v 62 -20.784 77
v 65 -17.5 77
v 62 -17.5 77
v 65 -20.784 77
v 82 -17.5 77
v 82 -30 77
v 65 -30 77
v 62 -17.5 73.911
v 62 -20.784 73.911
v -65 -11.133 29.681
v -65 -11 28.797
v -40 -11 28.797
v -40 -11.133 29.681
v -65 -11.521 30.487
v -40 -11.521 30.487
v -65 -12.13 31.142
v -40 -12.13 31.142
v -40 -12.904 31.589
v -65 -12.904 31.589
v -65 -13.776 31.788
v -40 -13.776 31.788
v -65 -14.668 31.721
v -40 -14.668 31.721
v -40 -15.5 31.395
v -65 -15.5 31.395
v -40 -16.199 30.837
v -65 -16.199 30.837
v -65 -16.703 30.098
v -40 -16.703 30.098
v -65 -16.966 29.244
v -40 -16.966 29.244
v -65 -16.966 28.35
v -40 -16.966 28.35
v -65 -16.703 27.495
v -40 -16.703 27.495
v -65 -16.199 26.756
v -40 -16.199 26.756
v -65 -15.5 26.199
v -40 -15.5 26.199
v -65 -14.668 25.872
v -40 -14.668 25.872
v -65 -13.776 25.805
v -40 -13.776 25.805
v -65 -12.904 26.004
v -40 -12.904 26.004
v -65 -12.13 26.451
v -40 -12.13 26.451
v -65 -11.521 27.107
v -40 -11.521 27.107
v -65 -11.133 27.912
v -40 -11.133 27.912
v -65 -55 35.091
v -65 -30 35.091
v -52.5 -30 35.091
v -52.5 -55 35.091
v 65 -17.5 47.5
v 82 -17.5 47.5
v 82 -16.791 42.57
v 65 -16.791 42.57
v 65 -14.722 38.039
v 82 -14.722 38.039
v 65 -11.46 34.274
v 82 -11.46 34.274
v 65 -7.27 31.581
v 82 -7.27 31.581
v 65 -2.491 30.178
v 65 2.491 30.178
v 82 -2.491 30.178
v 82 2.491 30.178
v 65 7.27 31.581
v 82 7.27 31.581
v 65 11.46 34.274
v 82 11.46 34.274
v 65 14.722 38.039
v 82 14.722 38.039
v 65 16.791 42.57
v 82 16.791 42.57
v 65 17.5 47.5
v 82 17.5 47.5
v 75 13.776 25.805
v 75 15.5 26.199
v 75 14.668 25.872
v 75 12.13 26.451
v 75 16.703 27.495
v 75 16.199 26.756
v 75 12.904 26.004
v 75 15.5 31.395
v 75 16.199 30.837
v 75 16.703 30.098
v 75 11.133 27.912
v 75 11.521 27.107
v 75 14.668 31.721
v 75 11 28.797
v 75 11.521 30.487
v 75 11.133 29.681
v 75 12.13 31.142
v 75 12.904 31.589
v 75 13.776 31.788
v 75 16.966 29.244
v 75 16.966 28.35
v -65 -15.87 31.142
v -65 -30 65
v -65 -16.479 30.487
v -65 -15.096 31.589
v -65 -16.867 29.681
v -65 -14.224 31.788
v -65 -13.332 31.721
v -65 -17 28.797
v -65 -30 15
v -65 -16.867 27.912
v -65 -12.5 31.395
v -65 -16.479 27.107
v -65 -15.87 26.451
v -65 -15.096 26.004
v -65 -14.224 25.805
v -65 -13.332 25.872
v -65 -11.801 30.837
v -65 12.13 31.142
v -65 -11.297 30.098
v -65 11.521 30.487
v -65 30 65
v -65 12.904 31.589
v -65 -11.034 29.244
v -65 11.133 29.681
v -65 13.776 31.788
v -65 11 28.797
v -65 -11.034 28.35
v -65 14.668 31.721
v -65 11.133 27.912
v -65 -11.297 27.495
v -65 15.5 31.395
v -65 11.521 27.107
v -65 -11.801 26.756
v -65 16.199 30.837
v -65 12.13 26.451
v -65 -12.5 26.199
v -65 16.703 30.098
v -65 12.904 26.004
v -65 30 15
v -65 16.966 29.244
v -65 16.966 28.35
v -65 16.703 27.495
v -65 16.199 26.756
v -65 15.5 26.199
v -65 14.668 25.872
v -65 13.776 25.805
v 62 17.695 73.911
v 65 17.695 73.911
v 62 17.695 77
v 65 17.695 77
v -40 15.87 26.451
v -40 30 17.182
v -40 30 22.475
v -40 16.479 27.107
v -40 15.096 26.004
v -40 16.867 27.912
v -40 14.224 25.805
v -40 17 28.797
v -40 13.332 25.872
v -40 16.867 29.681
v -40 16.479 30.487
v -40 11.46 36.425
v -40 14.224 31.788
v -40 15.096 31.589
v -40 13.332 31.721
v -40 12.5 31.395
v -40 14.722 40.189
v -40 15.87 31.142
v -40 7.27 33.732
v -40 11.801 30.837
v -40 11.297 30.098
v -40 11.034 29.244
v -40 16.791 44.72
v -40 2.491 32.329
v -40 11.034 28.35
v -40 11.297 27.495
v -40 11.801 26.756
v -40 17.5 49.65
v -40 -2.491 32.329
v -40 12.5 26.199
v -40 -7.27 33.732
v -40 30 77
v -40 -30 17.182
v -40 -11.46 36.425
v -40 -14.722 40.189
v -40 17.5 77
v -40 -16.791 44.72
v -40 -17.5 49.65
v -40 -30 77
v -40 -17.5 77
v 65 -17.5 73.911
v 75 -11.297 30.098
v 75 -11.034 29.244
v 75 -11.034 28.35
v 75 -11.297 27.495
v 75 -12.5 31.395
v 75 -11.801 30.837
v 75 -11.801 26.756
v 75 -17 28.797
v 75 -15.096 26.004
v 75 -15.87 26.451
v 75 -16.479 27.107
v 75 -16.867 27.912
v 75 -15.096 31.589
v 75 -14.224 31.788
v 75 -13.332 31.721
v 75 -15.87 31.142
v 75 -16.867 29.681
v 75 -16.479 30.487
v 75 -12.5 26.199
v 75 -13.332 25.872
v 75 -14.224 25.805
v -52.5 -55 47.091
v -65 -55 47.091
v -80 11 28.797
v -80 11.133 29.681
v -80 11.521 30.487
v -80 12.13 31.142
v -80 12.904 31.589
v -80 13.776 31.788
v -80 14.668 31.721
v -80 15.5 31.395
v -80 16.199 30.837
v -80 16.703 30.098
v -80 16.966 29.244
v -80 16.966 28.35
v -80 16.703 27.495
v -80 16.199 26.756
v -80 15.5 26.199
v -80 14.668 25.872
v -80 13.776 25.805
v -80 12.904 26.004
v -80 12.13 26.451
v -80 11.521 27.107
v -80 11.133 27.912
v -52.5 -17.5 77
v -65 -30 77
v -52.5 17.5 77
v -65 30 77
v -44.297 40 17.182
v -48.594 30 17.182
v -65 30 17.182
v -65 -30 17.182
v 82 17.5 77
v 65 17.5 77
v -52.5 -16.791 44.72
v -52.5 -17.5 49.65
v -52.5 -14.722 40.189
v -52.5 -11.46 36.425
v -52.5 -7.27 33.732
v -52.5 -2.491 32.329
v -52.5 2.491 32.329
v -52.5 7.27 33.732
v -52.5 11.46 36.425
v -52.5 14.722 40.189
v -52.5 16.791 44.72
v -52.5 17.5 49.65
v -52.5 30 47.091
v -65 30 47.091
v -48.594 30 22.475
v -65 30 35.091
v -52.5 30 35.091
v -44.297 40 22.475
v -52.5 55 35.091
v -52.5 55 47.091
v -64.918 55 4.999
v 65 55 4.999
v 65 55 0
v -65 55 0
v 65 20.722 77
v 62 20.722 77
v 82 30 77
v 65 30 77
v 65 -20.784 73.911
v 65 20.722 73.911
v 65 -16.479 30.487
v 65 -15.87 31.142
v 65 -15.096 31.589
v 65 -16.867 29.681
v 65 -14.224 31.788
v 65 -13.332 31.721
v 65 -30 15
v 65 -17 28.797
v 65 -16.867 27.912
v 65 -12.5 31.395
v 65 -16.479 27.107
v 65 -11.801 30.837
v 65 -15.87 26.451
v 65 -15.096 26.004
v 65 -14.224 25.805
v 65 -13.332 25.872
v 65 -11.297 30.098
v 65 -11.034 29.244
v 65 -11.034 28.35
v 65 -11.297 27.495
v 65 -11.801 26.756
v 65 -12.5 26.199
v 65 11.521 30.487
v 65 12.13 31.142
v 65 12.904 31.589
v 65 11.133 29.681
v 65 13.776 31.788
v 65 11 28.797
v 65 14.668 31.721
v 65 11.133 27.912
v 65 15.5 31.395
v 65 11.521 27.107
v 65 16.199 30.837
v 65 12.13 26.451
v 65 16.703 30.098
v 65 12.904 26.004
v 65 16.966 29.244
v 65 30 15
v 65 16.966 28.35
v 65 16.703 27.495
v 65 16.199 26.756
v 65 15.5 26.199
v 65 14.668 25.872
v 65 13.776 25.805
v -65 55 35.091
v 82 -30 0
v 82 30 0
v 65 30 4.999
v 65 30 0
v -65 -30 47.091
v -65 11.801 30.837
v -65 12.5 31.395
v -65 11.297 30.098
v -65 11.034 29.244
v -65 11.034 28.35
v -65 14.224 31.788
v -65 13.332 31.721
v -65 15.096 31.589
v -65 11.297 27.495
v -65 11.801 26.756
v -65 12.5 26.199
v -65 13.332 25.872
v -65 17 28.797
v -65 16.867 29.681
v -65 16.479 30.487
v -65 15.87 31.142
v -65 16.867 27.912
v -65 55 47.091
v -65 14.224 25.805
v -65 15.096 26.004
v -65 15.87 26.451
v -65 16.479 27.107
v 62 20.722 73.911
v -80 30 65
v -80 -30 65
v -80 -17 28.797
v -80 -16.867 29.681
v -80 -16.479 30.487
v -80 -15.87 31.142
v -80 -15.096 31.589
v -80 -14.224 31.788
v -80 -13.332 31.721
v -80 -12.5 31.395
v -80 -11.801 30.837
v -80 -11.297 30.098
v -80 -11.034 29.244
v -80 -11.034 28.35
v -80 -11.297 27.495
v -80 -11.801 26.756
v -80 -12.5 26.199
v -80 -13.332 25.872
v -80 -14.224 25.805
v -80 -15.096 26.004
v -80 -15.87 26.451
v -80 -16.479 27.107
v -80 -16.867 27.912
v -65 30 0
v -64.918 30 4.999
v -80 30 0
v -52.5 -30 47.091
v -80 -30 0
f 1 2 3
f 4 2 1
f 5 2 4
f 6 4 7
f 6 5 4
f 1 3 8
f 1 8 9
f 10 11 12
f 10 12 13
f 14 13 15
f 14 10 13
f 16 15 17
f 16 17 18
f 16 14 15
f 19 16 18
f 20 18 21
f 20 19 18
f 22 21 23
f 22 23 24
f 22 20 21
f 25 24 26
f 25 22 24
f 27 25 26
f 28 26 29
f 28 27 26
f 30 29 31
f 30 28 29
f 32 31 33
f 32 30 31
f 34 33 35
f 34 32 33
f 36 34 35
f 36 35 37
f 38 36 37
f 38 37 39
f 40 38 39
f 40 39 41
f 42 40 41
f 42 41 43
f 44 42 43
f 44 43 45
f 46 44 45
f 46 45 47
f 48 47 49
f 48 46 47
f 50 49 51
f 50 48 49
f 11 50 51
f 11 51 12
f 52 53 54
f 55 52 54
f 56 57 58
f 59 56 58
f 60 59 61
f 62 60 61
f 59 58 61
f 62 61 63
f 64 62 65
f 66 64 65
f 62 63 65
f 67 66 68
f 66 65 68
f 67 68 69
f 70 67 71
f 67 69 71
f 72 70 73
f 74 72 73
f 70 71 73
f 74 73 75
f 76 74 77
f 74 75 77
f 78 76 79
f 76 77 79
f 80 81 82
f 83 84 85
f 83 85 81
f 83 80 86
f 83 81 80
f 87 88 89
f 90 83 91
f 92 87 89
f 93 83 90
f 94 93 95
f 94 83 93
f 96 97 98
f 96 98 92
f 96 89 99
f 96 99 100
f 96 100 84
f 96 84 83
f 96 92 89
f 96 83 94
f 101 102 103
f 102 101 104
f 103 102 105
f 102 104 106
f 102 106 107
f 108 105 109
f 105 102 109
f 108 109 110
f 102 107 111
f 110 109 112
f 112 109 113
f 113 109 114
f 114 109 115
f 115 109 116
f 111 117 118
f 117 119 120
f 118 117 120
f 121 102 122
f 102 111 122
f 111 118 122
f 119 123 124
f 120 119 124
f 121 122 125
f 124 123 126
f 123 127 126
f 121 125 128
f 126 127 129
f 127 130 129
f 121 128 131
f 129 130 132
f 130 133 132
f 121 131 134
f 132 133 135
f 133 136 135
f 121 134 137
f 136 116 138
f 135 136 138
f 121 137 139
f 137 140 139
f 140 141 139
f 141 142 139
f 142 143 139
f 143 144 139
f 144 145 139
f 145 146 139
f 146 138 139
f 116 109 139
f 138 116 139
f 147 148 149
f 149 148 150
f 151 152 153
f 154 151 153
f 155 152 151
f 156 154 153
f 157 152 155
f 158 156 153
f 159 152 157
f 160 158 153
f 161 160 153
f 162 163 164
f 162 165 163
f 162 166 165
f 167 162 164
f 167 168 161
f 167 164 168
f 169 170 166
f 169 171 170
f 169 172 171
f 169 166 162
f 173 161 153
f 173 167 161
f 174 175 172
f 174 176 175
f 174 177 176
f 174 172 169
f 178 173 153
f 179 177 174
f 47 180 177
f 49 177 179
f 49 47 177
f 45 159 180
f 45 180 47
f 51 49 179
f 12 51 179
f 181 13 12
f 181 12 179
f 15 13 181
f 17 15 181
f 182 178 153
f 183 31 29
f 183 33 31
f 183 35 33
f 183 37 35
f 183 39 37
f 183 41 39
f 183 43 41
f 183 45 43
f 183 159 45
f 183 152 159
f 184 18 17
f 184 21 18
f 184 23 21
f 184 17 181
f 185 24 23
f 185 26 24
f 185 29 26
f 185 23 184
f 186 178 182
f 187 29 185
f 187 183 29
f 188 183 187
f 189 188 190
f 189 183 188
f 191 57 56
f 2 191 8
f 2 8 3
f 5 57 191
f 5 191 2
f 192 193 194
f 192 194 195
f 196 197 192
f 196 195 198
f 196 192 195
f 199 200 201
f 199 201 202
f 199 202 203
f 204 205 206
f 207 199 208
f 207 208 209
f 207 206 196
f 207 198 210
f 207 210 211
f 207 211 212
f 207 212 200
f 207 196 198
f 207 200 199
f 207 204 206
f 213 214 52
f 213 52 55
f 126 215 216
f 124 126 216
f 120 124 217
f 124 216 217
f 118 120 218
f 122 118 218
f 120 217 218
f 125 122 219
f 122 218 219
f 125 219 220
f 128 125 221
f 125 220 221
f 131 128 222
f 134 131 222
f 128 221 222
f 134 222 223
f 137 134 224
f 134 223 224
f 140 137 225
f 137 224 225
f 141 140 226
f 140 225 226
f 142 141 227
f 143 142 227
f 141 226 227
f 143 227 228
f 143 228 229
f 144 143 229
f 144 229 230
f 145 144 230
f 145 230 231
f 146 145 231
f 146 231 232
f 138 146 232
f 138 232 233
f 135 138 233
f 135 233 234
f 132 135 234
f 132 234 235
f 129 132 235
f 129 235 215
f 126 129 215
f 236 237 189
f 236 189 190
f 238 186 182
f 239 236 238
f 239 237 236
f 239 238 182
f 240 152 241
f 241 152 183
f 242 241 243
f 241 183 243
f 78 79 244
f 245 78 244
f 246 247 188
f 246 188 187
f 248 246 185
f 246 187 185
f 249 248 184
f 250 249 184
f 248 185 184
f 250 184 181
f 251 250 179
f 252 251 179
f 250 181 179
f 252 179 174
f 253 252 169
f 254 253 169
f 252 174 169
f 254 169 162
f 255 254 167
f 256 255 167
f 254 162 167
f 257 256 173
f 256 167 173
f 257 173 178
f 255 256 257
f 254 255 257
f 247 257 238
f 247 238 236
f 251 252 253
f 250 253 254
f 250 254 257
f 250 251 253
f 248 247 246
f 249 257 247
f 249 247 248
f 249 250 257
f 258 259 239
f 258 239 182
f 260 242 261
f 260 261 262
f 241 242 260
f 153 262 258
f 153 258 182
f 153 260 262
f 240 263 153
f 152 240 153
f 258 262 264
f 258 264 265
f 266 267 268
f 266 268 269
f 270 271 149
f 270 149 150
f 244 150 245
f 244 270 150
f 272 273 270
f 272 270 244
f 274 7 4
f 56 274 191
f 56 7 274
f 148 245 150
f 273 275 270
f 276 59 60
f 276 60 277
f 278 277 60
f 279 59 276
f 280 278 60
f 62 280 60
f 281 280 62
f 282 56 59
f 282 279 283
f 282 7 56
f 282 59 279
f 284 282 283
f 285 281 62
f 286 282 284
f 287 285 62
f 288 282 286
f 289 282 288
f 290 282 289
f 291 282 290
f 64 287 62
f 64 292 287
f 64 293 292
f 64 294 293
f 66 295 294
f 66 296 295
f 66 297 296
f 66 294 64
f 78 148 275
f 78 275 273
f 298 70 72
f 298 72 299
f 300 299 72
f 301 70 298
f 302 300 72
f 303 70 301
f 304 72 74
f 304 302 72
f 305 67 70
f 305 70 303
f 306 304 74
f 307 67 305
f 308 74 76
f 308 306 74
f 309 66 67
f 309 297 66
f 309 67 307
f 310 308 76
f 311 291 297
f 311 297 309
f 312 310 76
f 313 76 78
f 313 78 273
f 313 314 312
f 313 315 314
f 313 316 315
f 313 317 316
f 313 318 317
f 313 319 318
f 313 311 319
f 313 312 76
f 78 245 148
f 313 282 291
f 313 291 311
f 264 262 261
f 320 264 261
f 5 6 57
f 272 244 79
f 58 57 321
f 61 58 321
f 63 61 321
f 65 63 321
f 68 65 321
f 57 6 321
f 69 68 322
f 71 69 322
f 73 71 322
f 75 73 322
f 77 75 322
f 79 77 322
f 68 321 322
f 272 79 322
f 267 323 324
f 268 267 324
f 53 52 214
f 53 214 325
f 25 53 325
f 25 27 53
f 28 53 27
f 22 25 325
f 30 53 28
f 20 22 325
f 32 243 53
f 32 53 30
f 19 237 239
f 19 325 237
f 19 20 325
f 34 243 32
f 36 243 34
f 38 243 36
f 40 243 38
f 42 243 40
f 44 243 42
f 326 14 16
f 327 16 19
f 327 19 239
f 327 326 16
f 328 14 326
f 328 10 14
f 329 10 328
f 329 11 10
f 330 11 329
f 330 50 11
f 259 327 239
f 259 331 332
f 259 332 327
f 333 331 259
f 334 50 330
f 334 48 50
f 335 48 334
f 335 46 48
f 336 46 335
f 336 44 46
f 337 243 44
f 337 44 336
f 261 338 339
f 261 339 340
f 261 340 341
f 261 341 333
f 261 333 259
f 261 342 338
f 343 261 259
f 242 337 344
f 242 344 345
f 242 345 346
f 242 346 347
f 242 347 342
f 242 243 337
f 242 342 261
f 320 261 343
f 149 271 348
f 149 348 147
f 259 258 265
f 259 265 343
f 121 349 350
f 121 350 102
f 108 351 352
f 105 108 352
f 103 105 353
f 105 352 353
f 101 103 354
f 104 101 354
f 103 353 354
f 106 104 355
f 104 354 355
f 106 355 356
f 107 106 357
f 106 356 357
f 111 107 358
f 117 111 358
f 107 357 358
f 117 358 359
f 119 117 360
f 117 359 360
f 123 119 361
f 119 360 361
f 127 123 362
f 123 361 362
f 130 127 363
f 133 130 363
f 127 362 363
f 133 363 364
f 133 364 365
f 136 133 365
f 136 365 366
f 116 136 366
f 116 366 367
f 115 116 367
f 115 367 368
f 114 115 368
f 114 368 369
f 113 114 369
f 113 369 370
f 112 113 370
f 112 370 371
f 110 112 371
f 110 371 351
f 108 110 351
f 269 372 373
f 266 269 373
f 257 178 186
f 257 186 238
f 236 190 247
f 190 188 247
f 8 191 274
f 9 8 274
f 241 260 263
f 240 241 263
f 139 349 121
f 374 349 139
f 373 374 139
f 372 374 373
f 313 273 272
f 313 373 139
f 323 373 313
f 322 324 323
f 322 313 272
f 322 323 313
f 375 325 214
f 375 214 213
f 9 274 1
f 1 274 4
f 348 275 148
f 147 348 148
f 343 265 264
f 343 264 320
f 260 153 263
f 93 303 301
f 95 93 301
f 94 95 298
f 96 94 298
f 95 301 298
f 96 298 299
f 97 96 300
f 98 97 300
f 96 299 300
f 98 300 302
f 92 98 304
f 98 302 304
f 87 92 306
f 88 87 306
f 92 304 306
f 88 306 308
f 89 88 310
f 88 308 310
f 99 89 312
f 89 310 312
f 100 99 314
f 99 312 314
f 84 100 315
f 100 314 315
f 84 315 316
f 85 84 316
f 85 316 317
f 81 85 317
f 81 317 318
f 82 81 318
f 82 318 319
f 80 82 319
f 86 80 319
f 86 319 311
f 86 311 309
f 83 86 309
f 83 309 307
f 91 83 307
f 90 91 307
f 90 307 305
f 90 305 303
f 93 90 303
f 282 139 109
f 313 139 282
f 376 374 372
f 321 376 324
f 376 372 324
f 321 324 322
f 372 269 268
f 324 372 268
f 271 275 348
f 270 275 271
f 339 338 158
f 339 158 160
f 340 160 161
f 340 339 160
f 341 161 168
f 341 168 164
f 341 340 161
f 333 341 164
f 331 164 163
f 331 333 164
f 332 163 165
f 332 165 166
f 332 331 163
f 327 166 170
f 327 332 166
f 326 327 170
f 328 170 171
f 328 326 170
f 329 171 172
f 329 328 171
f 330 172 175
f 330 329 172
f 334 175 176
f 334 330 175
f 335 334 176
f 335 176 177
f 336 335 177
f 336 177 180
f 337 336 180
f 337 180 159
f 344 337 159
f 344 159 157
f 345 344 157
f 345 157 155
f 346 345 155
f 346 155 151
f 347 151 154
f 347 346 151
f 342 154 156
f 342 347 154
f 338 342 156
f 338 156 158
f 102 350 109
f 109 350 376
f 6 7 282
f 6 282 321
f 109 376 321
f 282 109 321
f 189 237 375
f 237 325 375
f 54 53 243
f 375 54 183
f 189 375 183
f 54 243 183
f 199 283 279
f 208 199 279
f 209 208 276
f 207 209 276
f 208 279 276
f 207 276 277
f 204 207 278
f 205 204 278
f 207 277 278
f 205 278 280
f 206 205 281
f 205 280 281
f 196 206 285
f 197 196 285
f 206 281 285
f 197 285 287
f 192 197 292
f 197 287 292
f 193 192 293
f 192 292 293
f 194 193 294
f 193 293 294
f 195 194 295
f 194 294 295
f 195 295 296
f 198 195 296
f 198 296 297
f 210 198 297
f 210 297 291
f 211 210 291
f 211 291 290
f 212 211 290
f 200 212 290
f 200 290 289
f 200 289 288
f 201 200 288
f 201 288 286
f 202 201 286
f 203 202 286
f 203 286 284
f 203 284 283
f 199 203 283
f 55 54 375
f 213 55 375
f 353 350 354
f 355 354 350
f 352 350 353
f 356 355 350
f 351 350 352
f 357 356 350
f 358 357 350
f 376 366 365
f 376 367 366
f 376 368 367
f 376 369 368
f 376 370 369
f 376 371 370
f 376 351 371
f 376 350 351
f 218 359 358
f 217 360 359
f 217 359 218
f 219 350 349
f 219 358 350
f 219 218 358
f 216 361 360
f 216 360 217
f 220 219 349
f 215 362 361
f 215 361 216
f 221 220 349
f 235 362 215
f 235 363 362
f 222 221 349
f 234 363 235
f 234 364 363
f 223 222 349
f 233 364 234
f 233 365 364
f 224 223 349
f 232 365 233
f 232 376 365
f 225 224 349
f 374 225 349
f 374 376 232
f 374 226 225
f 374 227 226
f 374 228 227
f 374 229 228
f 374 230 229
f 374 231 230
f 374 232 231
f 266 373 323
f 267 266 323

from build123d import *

# Parameters (mm, degrees)
F0_W      = 15
F0_H      = 60
F1_DEPTH  = 65
F0_W_2    = 17
F0_W_3    = 130
F2_DEPTH  = 15
F4_DEPTH  = 17
F5_R      = 3
F6_DEPTH  = 155
F7_W      = 60
F7_H      = 49.8176734522
F7_R      = 3
F8_DEPTH  = 25
F10_DEPTH = 12.5
F12_W     = 25
F12_H     = 60
F13_DEPTH = 2
F15_DEPTH = 25
F16_W     = 12.5
F16_H     = 12
F17_DEPTH = 25
F18_DEPTH = 25
F19_W     = 12.5
F19_H     = 12
F20_DEPTH = 25
F21_DEPTH = 12
F22_W     = 8.5935546458
F22_H     = 5.2922566906
F23_DEPTH = 10
F25_DEPTH = 10
F26_DEPTH = 12
F27_W     = 3.2838956267
F27_H     = 3.0892942548
F27_W_2   = 3.0268859118
F28_DEPTH = 3


# Not quite as in the source:
# - a feature names something its author has since deleted; it is built from what else it names


with BuildPart() as f1:
    # F0 (on Top) → F1 (new body)
    with BuildSketch(Plane.XY):
        with Locations((-72.5, 0)):
            Rectangle(F0_W, F0_H)
    extrude(amount=F1_DEPTH)



with BuildPart() as f1b:
    # F0 (on Top) → F1, piece 2 (new body)
    with BuildSketch(Plane.XY):
        with Locations((73.5, 0)):
            Rectangle(F0_W_2, F0_H)
    extrude(amount=F1_DEPTH)


with BuildPart() as f1_1:
    add(f1.part)

    add(f1b.part)  # F2 merges F1b
    # F0 (on Top) → F2 (join)
    with BuildSketch(Plane.XY):
        Rectangle(F0_W_3, F0_H)
    extrude(amount=F2_DEPTH)

    # F3 (on face) → F4 (cut)
    with BuildSketch(Plane.YZ.offset(82)):
        with BuildLine():
            ThreePointArc((-17.5, 47.5), (0, 30), (17.5, 47.5))
            ThreePointArc((17.5, 47.5), (0, 65), (-17.5, 47.5))
        make_face()
        with BuildLine():
            Line((-17.5, 65), (-17.5, 47.5))
            ThreePointArc((-17.5, 47.5), (-12.3743686586, 59.8743686829), (3.43e-08, 65))
            Line((3.43e-08, 65), (-17.5, 65))
        make_face()
        with BuildLine():
            ThreePointArc((3.43e-08, 65), (12.3743686829, 59.8743686586), (17.5, 47.5))
            Line((17.5, 47.5), (17.5, 65))
            Line((17.5, 65), (3.43e-08, 65))
        make_face()
    extrude(amount=-F4_DEPTH, mode=Mode.SUBTRACT)

    # F5 (on face) → F6 (cut)
    with BuildSketch(Plane(origin=(-80, 0, 0), x_dir=(0, -1, 0), z_dir=(-1, 0, 0))):
        with Locations((-14, 28.7966762781)):
            Circle(F5_R)
        with Locations((14, 28.7966762781)):
            Circle(F5_R)
    extrude(amount=-F6_DEPTH, mode=Mode.SUBTRACT)

    # F11: union 

    # F14 (on face) → F15 (join)
    with BuildSketch(Plane(origin=(0, 30, 0), x_dir=(-1, 0, 0), z_dir=(0, 1, 0))):
        Polygon((-65, 4.9993242615), (-65, 0), (65, 0), (64.9177994628, 4.9993242615), align=None)
    extrude(amount=F15_DEPTH)

    # F26 (add): faces of the model
    f26_faces = [f1_1.faces().sort_by_distance(p)[0] for p in [
        (73.5, -23.75, 65),
        (73.5, 23.75, 65),
    ]]
    extrude(f26_faces, amount=F26_DEPTH)

    # F27 (on face) → F28 (join)
    with BuildSketch(Plane(origin=(65, 0, 0), x_dir=(0, -1, 0), z_dir=(-1, 0, 0))):
        with Locations((19.1419478133, 75.4553528726)):
            Rectangle(F27_W, F27_H)
        with Locations((-19.2088121548, 75.4553528726)):
            Rectangle(F27_W_2, F27_H)
    extrude(amount=F28_DEPTH)


with BuildPart() as f8:
    # F7 (on face) → F8 (new body)
    with BuildSketch(Plane.YZ.offset(-65)):
        with Locations((0, 40.0911632739)):
            Rectangle(F7_W, F7_H)
        with Locations((-14, 28.7966762781)):
            Circle(F7_R, mode=Mode.SUBTRACT)
        with Locations((14, 28.7966762781)):
            Circle(F7_R, mode=Mode.SUBTRACT)
    extrude(amount=F8_DEPTH)

    # F9 (on face) → F10 (cut)
    with BuildSketch(Plane.YZ.offset(-40)):
        with BuildLine():
            ThreePointArc((-17.5, 49.6503765881), (0, 32.1503765881), (17.5, 49.6503765881))
            ThreePointArc((17.5, 49.6503765881), (15.0554364312, 58.5713537692), (8.4047047011, 65))
            Line((8.4047047011, 65), (-8.4047047011, 65))
            ThreePointArc((-8.4047047011, 65), (-15.0554364312, 58.5713537692), (-17.5, 49.6503765881))
        make_face()
        with BuildLine():
            ThreePointArc((8.4047047011, 65), (15.0554364312, 58.5713537692), (17.5, 49.6503765881))
            Line((17.5, 49.6503765881), (17.5, 65))
            Line((17.5, 65), (8.4047047011, 65))
        make_face()
        with BuildLine():
            Line((-17.5, 65), (-17.5, 49.6503765881))
            ThreePointArc((-17.5, 49.6503765881), (-15.0554364312, 58.5713537692), (-8.4047047011, 65))
            Line((-8.4047047011, 65), (-17.5, 65))
        make_face()
    extrude(amount=-F10_DEPTH, mode=Mode.SUBTRACT)

    # F12 (on face) → F13 (cut)
    with BuildSketch(Plane(origin=(0, 0, 15.1823265478), x_dir=(1, 0, 0), z_dir=(0, 0, -1))):
        with Locations((-52.5, 0)):
            Rectangle(F12_W, F12_H)
    extrude(amount=-F13_DEPTH, mode=Mode.SUBTRACT)

    # F16 (on face) → F17 (join)
    with BuildSketch(Plane.XZ.offset(30)):
        with Locations((-58.75, 41.0911632739)):
            Rectangle(F16_W, F16_H)
    extrude(amount=F17_DEPTH)

    # F19 (on face) → F20 (join)
    with BuildSketch(Plane(origin=(0, 30, 0), x_dir=(-1, 0, 0), z_dir=(0, 1, 0))):
        with Locations((58.75, 41.0911632739)):
            Rectangle(F19_W, F19_H)
    extrude(amount=F20_DEPTH)

    # F21 (add): a face of the model
    f21_faces = [f8.faces().sort_by_distance(p)[0] for p in [
        (-55.0735294118, 0, 65),
    ]]
    extrude(f21_faces, amount=F21_DEPTH)

    # F22 (on face) → F23 (join)
    with BuildSketch(Plane(origin=(0, 30, 0), x_dir=(-1, 0, 0), z_dir=(0, 1, 0))):
        with Locations((44.2967773229, 19.8284548931)):
            Rectangle(F22_W, F22_H)
    extrude(amount=F23_DEPTH)

    # F24 (on face) → F25 (cut)
    with BuildSketch(Plane.XY.offset(22.4745832384)):
        Polygon((-44.2967773229, 40), (-40, 30), (-40, 40), align=None)
        Polygon((-48.5935546458, 30), (-44.2967773229, 40), (-48.5935546458, 40), align=None)
    extrude(amount=-F25_DEPTH, mode=Mode.SUBTRACT)


with BuildPart() as f18:
    # F16 (on face) → F18 (new body)
    with BuildSketch(Plane.XZ.offset(30)):
        with Locations((-58.75, 41.0911632739)):
            Rectangle(F16_W, F16_H)
    extrude(amount=F18_DEPTH)


solid = Compound([f1_1.part, f8.part])
